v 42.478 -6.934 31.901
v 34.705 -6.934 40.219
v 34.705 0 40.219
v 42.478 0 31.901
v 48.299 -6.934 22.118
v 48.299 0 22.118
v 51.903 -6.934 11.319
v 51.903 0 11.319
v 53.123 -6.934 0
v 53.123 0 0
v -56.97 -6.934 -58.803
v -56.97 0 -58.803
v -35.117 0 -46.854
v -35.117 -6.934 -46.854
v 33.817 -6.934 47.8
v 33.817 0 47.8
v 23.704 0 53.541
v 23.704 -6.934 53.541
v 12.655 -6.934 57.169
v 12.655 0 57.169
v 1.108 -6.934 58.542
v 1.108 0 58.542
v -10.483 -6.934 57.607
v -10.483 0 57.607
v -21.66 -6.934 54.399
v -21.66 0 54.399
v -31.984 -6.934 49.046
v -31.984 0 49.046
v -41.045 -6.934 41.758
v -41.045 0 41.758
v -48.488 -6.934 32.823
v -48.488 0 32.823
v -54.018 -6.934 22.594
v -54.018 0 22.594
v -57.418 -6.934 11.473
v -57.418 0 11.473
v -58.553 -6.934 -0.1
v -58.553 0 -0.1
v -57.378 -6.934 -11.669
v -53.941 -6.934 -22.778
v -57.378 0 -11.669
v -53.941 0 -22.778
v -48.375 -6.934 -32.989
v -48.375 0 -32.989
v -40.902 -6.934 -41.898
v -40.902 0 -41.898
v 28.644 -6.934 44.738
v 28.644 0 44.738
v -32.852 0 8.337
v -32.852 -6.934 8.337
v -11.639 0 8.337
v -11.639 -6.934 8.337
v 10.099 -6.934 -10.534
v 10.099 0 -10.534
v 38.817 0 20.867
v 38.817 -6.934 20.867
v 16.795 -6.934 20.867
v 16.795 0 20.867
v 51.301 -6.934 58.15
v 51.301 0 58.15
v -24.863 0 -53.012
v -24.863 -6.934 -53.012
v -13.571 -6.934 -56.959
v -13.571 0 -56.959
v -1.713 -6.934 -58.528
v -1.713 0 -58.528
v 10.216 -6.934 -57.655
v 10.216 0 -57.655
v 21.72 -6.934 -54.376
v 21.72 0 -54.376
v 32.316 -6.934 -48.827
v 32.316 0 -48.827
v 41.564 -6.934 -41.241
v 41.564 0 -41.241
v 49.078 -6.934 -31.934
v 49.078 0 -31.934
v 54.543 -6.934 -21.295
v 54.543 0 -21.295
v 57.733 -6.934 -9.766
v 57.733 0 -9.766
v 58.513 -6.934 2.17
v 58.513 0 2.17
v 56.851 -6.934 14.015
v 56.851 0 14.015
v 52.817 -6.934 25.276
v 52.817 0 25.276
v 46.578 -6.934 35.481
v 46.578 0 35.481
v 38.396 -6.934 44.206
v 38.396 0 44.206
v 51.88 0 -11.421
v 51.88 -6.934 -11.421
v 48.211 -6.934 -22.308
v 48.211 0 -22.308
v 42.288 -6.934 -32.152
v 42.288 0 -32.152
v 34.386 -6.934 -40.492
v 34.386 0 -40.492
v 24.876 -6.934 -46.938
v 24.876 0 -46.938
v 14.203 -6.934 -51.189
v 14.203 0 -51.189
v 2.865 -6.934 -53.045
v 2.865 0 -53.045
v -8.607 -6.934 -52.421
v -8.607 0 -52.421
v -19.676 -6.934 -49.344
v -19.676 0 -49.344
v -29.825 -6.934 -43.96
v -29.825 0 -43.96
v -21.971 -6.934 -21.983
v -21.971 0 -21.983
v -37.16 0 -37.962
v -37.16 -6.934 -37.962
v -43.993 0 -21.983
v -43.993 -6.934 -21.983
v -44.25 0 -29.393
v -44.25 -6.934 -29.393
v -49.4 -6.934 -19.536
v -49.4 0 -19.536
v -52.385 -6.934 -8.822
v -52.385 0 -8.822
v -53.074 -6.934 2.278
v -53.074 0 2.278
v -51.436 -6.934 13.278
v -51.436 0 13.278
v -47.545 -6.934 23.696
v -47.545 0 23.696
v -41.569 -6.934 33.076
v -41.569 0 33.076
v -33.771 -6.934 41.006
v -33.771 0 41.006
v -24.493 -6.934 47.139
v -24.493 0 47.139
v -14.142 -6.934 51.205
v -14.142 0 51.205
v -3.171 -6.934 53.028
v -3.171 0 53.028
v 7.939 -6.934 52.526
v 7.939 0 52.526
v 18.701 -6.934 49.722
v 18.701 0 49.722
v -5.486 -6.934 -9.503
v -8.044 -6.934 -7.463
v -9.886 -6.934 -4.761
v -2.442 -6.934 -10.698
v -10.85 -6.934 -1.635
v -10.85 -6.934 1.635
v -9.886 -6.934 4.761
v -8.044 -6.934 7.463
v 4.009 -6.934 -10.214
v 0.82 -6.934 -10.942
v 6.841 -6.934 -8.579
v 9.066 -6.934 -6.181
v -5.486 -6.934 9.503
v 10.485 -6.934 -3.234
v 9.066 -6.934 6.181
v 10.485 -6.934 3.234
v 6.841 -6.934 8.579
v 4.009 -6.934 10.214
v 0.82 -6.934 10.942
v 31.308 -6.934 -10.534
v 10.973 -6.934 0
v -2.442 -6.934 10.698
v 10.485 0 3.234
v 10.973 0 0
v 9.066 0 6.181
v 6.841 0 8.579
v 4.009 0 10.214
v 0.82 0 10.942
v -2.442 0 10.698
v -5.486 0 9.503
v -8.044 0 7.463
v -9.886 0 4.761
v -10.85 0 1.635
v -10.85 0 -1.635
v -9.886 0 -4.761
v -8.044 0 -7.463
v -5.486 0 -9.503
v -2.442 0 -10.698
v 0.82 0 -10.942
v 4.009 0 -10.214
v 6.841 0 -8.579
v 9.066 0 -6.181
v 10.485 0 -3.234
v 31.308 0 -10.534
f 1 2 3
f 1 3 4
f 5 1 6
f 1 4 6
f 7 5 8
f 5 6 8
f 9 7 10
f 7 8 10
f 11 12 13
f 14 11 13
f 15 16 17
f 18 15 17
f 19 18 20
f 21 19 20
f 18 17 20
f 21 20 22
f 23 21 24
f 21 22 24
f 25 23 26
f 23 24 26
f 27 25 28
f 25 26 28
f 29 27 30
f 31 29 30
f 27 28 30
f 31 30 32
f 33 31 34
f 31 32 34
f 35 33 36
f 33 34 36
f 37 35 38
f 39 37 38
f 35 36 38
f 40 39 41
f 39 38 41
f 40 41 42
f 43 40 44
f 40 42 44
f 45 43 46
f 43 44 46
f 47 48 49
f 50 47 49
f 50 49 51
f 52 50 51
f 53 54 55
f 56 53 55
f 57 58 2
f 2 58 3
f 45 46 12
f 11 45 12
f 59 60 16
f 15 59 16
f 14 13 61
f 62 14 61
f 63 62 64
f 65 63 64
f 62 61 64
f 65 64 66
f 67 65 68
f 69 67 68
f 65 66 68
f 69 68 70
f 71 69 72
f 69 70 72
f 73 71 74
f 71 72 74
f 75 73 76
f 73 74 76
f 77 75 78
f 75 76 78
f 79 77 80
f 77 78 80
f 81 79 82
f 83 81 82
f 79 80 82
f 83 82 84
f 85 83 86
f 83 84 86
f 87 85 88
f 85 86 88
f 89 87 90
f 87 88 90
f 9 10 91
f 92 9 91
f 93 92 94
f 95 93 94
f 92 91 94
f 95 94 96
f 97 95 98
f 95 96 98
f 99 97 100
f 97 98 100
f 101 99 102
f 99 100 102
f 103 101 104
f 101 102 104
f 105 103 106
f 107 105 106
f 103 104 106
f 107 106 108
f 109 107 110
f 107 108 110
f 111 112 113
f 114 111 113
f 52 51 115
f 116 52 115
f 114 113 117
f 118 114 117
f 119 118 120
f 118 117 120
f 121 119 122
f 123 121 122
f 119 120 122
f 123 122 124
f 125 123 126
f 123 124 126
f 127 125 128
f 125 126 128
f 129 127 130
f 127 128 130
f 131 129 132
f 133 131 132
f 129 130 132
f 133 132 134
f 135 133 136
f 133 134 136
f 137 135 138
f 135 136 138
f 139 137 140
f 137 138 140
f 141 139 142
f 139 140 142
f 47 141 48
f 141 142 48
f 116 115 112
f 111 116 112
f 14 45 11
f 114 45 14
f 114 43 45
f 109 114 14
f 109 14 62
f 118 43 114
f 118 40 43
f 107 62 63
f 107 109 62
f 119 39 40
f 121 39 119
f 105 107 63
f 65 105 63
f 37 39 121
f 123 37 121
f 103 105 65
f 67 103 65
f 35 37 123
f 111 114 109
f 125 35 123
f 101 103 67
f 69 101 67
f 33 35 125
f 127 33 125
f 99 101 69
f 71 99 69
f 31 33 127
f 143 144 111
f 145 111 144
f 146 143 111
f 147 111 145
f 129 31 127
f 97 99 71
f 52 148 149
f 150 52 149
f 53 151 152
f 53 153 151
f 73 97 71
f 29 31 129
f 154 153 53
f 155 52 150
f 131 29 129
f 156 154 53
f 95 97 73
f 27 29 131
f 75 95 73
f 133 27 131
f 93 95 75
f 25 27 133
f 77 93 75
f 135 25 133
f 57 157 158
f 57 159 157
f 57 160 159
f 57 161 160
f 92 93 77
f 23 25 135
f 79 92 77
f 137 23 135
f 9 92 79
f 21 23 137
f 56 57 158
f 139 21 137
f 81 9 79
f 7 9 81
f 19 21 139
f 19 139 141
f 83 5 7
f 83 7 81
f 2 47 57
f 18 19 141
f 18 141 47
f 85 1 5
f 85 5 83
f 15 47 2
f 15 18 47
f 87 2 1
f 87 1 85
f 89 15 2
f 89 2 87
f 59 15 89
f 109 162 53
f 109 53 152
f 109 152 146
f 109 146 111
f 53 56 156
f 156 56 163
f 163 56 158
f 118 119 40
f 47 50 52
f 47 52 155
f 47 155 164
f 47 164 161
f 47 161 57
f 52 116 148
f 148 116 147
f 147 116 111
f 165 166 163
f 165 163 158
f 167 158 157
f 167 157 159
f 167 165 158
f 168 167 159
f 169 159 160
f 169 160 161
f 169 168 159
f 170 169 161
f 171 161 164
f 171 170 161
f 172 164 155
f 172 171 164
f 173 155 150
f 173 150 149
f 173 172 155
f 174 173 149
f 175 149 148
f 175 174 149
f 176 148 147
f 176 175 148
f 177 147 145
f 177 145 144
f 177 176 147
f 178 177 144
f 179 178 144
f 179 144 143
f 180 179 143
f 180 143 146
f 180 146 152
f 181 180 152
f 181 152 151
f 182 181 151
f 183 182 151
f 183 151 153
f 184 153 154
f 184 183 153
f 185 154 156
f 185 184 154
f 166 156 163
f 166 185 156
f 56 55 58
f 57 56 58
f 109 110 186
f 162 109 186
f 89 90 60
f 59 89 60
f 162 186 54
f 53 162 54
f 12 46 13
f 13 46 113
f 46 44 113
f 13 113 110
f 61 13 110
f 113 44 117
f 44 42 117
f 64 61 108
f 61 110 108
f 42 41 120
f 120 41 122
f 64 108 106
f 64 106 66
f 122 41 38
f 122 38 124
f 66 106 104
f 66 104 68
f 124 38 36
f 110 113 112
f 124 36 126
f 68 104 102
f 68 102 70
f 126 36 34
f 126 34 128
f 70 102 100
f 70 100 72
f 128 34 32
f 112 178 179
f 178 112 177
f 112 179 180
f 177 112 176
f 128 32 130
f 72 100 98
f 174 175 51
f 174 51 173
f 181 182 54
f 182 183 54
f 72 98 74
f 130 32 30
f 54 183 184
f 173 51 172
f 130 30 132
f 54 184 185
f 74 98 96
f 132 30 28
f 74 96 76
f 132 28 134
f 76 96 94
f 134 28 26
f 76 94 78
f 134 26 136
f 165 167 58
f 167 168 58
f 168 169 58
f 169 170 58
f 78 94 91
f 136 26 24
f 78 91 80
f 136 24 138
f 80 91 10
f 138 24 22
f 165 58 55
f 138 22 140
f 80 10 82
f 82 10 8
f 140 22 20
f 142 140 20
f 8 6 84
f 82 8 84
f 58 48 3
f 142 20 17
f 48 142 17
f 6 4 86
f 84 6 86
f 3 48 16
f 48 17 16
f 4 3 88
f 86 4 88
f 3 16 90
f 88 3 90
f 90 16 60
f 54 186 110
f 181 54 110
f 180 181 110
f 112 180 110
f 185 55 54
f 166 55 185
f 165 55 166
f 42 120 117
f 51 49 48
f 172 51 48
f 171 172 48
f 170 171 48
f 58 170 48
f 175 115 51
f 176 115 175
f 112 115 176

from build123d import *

# Parameters (mm, degrees)
F0_R     = 10.9728
F1_DEPTH = 6.9342


# Not quite as in the source:
# - a feature names something its author has since deleted; it is built from what else it names


with BuildPart() as f1:
    # F0 (on Front) → F1 (new body)
    with BuildSketch(Plane.XZ):
        with BuildLine():
            ThreePointArc((28.6439371533, 44.738406593), (31.7550616118, 42.5865732614), (34.7051660635, 40.2187967078))
            Line((34.7051660635, 40.2187967078), (38.3958422982, 44.2064153225))
            ThreePointArc((38.3958422982, 44.2064153225), (36.1509937048, 46.060324745), (33.8167671779, 47.8003568929))
            Line((33.8167671779, 47.8003568929), (28.6439371533, 44.738406593))
        make_face()
        with BuildLine():
            Line((38.3958422982, 44.2064153225), (34.7051660635, 40.2187967078))
            ThreePointArc((34.7051660635, 40.2187967078), (48.2991997583, 22.1175826623), (53.1225014483, 0))
            ThreePointArc((53.1225014483, 0), (24.8760182095, -46.9380855826), (-29.8247927528, -43.9600033823))
            Line((-29.8247927528, -43.9600033823), (-35.1168298869, -46.8535603786))
            ThreePointArc((-35.1168298869, -46.8535603786), (26.1940251259, -52.3671739658), (58.5529492123, 0))
            ThreePointArc((58.5529492123, 0), (53.2758747723, 24.2925714716), (38.3958422982, 44.2064153225))
        make_face()
        with BuildLine():
            ThreePointArc((33.8167671779, 47.8003568929), (36.1509937048, 46.060324745), (38.3958422982, 44.2064153225))
            Line((38.3958422982, 44.2064153225), (51.3007947444, 58.1496672696))
            Line((51.3007947444, 58.1496672696), (33.8167671779, 47.8003568929))
        make_face()
        with BuildLine():
            ThreePointArc((-37.1603482471, -37.9619372303), (-41.568846888, 33.0761413789), (28.6439371533, 44.738406593))
            Line((28.6439371533, 44.738406593), (33.8167671779, 47.8003568929))
            ThreePointArc((33.8167671779, 47.8003568929), (-44.9890332079, 37.475788884), (-40.9020715179, -41.898310312))
            Line((-40.9020715179, -41.898310312), (-37.1603482471, -37.9619372303))
        make_face()
        with BuildLine():
            Line((-35.1168298869, -46.8535603786), (-29.8247927528, -43.9600033823))
            ThreePointArc((-29.8247927528, -43.9600033823), (-33.6265739867, -41.1248547965), (-37.1603482471, -37.9619372303))
            Line((-37.1603482471, -37.9619372303), (-40.9020715179, -41.898310312))
            ThreePointArc((-40.9020715179, -41.898310312), (-38.090116415, -44.4701123559), (-35.1168298869, -46.8535603786))
        make_face()
        with BuildLine():
            Line((-56.9704473019, -58.8025860488), (-35.1168298869, -46.8535603786))
            ThreePointArc((-35.1168298869, -46.8535603786), (-38.090116415, -44.4701123559), (-40.9020715179, -41.898310312))
            Line((-40.9020715179, -41.898310312), (-56.9704473019, -58.8025860488))
        make_face()
        with BuildLine():
            Line((38.8165365087, 20.8673397533), (16.7947365087, 20.8673397533))
            Line((16.7947365087, 20.8673397533), (34.7051660635, 40.2187967078))
            ThreePointArc((34.7051660635, 40.2187967078), (31.7550616118, 42.5865732614), (28.6439371533, 44.738406593))
            Line((28.6439371533, 44.738406593), (-32.8515800228, 8.3374004968))
            Line((-32.8515800228, 8.3374004968), (-11.6390858311, 8.3374004968))
            Line((-11.6390858311, 8.3374004968), (-43.993112864, -21.982746443))
            Line((-43.993112864, -21.982746443), (-21.971312864, -21.982746443))
            Line((-21.971312864, -21.982746443), (-37.1603482471, -37.9619372303))
            ThreePointArc((-37.1603482471, -37.9619372303), (-33.6265739867, -41.1248547965), (-29.8247927528, -43.9600033823))
            Line((-29.8247927528, -43.9600033823), (31.308234758, -10.5339530787))
            Line((31.308234758, -10.5339530787), (10.099234758, -10.5339530787))
            Line((10.099234758, -10.5339530787), (38.8165365087, 20.8673397533))
        make_face()
        Circle(F0_R, mode=Mode.SUBTRACT)
    extrude(amount=F1_DEPTH)


solid = f1.part
